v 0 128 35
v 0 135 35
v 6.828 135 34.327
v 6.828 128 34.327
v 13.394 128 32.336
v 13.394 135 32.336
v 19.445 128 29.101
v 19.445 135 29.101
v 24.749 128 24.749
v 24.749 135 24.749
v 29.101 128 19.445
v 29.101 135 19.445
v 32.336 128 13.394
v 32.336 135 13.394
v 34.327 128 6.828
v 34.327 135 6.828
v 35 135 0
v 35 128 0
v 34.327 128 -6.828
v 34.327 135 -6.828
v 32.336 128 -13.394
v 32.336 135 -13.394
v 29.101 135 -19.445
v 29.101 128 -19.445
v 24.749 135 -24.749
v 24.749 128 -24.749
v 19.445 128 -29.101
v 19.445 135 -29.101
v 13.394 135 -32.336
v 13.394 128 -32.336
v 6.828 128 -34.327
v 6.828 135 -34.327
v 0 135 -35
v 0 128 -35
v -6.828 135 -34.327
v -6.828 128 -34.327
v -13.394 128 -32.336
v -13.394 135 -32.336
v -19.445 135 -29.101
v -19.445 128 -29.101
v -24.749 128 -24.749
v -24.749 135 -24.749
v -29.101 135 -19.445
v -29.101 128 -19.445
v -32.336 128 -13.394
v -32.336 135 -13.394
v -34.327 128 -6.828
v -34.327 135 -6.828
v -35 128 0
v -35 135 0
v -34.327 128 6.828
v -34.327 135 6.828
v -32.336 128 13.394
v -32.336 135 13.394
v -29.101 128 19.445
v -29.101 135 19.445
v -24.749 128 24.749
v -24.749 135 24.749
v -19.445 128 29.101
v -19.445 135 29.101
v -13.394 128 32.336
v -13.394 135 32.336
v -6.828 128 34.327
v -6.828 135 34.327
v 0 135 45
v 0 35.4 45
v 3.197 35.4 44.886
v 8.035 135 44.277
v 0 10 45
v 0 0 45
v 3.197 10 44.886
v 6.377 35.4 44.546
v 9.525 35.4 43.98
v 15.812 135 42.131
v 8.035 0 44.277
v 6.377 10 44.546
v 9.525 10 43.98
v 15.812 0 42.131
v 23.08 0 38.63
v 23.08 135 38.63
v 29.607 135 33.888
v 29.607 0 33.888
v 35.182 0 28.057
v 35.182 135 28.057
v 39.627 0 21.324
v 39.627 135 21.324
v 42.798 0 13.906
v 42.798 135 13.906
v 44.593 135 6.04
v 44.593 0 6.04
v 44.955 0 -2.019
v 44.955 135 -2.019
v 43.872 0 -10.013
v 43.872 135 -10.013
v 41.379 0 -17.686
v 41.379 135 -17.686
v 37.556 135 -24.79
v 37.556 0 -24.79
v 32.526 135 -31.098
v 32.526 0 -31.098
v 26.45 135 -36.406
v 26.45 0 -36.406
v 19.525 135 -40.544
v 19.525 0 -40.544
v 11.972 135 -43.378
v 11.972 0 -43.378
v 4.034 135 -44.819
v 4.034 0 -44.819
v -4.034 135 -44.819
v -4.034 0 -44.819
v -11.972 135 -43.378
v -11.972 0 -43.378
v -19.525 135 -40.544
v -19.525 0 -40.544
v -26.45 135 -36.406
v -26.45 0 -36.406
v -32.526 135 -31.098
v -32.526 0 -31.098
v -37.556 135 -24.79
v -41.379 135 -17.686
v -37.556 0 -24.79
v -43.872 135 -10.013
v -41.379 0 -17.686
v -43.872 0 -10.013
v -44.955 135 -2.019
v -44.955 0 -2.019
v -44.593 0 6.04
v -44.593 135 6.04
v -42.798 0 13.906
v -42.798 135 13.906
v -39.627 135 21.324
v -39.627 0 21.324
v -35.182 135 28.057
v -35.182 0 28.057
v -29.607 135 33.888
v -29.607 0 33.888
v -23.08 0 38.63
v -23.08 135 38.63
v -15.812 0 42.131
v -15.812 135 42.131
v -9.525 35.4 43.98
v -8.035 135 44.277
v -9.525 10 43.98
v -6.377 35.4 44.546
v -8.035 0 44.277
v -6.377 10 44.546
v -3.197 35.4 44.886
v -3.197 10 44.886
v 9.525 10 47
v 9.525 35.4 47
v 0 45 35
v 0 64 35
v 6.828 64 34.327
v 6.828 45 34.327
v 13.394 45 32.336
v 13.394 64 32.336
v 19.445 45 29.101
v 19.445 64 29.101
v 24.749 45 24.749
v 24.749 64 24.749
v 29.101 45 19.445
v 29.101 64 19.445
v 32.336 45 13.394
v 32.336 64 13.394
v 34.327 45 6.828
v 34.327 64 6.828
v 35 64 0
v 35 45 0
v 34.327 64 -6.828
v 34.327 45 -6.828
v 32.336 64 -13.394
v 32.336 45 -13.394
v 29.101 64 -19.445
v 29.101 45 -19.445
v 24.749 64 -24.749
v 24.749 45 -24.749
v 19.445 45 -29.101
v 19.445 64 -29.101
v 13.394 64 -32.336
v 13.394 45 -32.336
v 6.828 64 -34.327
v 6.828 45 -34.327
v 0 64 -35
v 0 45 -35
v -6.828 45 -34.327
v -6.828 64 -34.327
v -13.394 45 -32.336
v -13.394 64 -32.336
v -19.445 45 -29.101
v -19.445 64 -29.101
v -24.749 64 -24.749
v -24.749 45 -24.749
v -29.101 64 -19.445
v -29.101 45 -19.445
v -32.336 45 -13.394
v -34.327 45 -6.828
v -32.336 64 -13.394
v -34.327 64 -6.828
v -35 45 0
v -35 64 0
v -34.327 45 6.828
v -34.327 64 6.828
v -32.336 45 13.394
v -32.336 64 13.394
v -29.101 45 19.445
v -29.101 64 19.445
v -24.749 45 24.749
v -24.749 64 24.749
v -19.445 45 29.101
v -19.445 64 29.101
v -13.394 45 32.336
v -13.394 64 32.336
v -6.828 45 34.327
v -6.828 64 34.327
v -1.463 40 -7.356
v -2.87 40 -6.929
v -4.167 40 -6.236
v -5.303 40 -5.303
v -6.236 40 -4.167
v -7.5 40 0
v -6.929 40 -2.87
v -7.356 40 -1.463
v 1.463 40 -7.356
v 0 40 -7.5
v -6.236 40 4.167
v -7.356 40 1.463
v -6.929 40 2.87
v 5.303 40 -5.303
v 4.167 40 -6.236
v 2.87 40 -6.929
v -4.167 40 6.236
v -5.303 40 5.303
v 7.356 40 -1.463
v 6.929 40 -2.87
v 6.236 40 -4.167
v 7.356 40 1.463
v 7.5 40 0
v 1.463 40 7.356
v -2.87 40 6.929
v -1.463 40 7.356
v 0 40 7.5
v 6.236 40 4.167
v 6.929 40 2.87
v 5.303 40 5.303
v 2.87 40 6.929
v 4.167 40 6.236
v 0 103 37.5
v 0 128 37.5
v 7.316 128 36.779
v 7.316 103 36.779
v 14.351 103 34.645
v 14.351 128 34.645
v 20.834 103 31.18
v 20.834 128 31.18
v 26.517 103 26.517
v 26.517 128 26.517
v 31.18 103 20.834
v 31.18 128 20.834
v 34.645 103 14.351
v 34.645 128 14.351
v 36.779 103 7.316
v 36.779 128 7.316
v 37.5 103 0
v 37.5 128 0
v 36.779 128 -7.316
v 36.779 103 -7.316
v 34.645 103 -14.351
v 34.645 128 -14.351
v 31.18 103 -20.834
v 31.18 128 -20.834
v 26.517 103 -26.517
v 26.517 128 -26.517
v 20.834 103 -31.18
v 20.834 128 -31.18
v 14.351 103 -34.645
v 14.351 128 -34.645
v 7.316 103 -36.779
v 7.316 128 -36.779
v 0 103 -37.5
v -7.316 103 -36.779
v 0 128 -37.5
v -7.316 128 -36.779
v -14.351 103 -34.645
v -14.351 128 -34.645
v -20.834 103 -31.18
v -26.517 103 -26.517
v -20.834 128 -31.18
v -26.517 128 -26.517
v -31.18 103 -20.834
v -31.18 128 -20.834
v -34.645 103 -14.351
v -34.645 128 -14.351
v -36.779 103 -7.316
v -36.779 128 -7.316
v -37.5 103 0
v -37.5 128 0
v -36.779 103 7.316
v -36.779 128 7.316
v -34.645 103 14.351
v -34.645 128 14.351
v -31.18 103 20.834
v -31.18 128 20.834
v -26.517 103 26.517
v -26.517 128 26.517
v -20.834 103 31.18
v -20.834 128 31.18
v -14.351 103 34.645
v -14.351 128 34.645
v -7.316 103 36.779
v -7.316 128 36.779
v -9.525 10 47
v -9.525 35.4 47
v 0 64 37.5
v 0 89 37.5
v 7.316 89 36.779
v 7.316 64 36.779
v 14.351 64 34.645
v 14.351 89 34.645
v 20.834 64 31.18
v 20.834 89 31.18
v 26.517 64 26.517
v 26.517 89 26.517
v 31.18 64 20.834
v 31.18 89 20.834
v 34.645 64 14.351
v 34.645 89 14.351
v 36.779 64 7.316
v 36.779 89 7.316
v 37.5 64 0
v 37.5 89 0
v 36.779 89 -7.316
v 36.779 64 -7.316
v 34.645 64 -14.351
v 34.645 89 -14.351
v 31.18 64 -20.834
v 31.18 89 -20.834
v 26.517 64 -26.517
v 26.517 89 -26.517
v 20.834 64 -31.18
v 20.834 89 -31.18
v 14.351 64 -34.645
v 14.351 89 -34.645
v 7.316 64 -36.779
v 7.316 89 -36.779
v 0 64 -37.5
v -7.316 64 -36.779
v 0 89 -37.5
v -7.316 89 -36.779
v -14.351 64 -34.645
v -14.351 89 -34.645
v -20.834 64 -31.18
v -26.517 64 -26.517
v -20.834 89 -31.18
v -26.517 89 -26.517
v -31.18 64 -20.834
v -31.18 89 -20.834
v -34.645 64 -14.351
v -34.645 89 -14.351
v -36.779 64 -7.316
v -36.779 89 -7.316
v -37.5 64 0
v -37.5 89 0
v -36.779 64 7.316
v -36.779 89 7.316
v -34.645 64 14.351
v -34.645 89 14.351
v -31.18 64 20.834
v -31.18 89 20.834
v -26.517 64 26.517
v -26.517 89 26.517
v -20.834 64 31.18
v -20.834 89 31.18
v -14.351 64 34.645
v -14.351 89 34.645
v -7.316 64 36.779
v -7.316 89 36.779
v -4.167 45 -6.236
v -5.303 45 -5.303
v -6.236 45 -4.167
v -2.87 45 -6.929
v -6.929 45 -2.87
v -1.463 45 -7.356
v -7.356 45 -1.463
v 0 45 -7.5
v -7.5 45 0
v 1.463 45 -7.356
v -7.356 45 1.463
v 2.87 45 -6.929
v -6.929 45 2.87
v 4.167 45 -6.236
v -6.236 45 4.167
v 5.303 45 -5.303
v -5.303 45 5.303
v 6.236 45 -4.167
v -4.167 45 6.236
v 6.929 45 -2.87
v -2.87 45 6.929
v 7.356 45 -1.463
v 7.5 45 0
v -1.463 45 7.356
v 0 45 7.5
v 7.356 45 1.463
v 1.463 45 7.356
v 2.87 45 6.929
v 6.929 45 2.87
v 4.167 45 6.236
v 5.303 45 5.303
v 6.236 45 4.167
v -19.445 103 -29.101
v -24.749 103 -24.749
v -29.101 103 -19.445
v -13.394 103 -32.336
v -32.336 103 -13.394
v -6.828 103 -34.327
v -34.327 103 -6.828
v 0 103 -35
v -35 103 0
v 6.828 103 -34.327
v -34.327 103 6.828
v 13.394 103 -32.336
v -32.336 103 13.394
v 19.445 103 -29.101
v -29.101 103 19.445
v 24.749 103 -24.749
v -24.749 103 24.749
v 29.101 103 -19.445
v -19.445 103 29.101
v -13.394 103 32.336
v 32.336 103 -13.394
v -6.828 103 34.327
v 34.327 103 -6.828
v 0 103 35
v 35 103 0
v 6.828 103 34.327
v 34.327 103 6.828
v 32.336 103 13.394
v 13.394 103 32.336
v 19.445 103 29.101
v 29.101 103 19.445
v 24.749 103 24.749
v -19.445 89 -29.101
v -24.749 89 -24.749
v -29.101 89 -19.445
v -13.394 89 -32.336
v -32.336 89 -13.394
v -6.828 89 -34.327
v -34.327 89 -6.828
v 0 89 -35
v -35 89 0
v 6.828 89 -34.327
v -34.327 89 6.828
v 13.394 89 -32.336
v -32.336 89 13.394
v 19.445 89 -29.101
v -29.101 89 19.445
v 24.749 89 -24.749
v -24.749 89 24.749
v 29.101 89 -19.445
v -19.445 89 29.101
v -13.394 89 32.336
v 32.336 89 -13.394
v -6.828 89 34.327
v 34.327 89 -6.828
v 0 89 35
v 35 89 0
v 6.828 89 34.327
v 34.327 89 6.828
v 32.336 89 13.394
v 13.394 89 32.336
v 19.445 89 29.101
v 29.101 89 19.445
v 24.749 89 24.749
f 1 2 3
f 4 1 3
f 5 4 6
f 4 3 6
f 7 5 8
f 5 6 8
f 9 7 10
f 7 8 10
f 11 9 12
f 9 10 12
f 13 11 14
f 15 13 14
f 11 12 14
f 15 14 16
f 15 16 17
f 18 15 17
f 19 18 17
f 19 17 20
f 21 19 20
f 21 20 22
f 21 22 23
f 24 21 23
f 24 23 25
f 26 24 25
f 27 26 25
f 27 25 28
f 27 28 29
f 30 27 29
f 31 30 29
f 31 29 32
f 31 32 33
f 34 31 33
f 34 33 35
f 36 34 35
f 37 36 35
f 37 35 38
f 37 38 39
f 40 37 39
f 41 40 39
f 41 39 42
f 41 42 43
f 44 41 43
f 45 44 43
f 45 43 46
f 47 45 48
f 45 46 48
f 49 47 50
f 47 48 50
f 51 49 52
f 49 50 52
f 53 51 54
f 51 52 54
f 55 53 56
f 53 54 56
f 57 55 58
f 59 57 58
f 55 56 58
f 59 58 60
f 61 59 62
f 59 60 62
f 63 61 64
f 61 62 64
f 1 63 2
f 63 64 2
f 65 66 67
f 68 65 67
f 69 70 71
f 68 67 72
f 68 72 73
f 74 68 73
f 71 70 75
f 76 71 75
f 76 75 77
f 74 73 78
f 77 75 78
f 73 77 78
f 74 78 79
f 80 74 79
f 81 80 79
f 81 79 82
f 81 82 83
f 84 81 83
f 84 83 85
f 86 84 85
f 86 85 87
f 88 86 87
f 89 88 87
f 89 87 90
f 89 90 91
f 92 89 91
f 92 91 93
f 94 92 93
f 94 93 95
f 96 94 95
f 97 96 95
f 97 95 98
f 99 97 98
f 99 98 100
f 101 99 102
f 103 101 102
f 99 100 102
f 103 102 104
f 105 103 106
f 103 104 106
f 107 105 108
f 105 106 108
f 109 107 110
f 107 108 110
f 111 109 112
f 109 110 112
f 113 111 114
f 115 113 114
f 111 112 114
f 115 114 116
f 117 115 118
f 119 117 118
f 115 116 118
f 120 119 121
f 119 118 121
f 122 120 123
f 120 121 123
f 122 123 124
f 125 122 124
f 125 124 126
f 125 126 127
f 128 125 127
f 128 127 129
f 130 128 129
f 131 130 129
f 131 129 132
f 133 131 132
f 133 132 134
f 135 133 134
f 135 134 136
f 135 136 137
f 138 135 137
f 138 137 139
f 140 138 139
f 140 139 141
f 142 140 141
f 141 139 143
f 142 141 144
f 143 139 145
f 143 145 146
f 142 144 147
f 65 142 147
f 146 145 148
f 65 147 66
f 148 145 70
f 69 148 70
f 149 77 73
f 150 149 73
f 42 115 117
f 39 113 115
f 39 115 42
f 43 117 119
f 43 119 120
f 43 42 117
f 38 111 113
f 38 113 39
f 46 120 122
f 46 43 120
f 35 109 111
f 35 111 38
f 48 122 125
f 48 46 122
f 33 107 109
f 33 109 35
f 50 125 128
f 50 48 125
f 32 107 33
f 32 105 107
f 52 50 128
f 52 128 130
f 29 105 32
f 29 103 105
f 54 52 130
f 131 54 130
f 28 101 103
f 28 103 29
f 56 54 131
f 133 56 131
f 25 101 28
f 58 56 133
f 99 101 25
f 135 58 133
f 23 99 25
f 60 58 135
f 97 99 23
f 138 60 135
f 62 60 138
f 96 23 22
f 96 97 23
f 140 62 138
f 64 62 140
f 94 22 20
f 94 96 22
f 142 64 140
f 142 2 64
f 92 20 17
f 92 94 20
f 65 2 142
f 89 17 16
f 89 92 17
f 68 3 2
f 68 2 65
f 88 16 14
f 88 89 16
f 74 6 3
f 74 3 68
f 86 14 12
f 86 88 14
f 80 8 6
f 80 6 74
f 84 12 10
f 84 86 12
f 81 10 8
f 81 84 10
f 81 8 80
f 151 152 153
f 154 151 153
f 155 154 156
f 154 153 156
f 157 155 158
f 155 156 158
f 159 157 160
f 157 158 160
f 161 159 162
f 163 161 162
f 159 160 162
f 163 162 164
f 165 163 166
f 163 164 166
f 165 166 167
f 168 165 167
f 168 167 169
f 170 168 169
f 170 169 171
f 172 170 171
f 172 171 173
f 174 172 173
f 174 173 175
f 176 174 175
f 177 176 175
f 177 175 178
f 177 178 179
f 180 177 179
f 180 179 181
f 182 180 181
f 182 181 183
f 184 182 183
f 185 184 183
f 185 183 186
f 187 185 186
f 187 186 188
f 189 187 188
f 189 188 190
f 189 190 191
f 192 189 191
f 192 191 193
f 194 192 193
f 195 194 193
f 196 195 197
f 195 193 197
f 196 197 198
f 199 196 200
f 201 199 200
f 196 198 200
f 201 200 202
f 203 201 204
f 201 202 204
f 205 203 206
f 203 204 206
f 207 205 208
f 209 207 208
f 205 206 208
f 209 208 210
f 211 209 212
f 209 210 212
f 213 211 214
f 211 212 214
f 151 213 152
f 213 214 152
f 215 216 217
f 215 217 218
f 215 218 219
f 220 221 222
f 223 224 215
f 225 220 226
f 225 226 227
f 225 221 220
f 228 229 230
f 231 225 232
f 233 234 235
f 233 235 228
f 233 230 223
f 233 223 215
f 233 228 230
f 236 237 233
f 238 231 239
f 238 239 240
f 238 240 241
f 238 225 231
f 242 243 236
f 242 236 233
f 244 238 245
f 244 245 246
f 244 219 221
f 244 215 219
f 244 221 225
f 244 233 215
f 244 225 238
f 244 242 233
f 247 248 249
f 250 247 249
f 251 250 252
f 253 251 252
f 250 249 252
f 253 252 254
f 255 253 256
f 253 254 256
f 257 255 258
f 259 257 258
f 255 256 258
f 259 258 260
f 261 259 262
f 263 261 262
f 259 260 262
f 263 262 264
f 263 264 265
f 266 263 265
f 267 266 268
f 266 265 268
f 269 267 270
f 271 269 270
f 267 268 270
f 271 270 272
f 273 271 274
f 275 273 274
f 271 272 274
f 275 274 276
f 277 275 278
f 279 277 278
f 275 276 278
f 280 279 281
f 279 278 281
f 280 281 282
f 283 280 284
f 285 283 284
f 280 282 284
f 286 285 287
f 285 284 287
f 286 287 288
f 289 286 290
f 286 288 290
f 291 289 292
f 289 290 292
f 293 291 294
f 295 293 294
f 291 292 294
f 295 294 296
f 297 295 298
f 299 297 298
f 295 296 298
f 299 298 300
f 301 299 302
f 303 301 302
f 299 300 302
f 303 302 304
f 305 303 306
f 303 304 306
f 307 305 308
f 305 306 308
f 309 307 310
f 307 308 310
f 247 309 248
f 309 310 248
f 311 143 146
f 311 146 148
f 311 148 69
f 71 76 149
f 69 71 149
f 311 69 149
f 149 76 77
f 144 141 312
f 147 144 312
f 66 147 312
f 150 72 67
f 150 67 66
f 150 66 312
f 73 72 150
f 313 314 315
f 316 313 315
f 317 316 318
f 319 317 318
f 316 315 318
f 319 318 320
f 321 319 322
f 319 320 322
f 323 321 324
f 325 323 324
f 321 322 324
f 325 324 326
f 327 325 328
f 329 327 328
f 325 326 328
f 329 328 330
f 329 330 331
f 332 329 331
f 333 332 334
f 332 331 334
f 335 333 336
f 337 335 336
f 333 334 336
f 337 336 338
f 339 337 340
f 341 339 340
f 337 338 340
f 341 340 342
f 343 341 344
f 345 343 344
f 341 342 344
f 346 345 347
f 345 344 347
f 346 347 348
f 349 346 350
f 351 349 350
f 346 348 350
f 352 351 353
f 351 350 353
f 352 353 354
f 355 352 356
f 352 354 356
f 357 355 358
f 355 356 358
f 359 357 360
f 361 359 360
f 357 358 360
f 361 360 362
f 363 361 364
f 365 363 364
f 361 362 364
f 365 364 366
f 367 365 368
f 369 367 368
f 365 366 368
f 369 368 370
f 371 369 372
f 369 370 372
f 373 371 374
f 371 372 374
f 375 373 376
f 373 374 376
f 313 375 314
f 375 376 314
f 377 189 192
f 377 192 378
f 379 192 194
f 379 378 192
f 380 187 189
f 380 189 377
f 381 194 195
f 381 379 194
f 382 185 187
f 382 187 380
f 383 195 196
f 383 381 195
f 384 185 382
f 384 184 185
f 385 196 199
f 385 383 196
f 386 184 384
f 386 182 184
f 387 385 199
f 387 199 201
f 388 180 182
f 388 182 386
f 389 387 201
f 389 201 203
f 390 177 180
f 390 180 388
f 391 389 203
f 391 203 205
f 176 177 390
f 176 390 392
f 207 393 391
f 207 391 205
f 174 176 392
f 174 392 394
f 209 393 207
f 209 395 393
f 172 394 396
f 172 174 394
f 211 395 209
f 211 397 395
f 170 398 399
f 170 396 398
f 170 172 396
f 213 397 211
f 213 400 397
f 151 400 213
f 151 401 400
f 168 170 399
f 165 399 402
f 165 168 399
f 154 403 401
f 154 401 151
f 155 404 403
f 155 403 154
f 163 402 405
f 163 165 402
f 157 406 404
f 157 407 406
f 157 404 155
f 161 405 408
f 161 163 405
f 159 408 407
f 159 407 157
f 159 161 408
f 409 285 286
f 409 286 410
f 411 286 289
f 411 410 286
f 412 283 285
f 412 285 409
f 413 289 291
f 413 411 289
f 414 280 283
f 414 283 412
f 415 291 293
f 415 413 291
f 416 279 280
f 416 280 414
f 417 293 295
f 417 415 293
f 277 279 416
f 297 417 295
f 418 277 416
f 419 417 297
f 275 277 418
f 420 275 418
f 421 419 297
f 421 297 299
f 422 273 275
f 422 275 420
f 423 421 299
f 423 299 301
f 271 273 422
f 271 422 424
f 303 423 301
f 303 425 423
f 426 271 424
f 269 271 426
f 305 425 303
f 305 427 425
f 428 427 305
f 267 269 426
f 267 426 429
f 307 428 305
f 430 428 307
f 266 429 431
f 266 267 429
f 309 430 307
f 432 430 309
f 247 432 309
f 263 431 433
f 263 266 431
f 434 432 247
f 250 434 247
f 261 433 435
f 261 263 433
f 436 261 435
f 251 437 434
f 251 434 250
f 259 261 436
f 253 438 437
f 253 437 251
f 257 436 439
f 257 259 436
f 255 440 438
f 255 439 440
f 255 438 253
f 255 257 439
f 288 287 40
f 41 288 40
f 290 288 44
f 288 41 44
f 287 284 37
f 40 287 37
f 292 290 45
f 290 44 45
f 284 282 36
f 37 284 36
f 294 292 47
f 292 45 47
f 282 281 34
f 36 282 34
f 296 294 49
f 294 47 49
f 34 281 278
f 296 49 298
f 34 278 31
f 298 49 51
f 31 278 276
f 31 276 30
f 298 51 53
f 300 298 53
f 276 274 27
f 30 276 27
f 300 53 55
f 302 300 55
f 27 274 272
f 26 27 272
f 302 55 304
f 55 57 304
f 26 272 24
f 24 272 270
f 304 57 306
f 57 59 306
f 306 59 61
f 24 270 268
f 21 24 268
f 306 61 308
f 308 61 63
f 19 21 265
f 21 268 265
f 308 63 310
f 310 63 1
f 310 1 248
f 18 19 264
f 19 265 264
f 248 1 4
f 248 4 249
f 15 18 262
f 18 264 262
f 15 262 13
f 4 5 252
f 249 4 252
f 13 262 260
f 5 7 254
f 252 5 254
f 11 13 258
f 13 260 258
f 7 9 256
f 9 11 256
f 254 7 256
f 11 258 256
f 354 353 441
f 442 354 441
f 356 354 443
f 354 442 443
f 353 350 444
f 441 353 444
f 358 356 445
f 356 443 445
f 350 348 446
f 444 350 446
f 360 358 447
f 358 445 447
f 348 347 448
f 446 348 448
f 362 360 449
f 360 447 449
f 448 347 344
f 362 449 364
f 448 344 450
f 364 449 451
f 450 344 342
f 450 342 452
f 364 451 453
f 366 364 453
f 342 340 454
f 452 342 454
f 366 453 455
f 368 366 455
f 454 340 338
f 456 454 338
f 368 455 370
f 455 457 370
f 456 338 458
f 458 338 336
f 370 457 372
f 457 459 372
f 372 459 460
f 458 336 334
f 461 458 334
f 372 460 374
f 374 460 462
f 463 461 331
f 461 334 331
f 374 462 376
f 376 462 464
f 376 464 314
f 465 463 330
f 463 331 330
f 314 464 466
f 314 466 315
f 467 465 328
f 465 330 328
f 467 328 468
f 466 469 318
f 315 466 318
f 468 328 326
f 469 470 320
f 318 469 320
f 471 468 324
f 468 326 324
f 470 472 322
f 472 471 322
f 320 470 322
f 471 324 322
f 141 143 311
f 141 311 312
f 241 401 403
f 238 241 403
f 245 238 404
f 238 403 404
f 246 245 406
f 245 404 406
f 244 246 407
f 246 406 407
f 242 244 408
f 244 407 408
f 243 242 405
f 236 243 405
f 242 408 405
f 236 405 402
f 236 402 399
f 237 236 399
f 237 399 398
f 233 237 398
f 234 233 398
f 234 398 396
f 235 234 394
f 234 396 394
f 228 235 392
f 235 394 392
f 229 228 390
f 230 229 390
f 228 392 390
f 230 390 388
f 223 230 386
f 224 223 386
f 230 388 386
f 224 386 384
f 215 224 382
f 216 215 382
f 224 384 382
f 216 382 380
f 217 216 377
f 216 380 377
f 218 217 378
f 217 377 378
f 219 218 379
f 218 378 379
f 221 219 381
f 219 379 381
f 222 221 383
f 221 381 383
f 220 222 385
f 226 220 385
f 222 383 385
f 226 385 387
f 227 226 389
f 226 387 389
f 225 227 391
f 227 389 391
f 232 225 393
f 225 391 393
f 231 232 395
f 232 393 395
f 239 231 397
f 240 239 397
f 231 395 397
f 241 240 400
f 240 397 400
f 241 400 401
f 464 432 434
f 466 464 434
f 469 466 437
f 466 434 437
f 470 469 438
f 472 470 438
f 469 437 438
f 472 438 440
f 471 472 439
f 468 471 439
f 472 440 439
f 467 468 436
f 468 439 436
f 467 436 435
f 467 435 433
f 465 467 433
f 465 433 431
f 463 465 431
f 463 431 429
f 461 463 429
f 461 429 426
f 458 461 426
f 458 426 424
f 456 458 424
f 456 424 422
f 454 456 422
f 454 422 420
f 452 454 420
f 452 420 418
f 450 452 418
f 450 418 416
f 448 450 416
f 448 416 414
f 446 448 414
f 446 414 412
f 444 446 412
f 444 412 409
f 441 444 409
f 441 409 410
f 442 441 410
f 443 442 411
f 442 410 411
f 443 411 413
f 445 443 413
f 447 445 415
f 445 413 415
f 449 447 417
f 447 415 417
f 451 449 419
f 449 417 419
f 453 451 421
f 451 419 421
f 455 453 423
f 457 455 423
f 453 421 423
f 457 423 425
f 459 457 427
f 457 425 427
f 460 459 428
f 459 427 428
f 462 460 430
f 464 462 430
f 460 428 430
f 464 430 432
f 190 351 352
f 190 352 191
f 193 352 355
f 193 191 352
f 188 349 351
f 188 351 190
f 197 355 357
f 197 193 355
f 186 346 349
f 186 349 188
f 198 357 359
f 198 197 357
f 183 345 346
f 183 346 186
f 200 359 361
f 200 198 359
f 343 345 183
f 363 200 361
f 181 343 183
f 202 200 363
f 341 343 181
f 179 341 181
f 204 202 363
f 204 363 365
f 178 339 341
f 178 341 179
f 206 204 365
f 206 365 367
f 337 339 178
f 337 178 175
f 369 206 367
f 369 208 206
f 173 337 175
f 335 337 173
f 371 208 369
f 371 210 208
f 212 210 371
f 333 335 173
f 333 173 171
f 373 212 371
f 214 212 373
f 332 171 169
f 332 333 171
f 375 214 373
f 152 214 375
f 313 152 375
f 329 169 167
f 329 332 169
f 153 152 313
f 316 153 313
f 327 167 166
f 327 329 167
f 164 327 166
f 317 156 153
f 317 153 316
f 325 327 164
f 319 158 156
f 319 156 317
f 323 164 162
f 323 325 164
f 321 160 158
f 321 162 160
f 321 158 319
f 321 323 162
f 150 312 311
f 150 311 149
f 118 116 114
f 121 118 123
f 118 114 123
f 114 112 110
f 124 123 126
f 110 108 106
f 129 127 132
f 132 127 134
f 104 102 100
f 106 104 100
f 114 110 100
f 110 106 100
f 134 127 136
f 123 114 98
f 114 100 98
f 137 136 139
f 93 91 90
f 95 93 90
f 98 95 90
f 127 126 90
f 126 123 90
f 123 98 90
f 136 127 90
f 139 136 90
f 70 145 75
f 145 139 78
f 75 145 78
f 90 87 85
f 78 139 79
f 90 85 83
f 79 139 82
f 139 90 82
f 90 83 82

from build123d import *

# Parameters (mm, degrees)
SKETCH1_R                = 45
BOSS_EXTRUDE1_DEPTH      = 135
SKETCH2_R                = 35
CUT_EXTRUDE1_DEPTH       = 90
SKETCH3_R                = 37.5
SKETCH3_R_2              = 35
CUT_EXTRUDE2_DEPTH       = 25
SKETCH4_R                = 37.5
SKETCH4_R_2              = 35
CUT_EXTRUDE3_DEPTH       = 25
SKETCH5_R                = 7.5
CUT_EXTRUDE4_DEPTH       = 5
BOSS_EXTRUDE2_DEPTH      = 2
BOSS_EXTRUDE2_DEPTH_BACK = 4
SKETCH6_W                = 19.05
SKETCH6_H                = 25.4


with BuildPart() as part:
    # Sketch1 → Boss-Extrude1 (new body)
    with BuildSketch(Plane(origin=(0, 0, 0), x_dir=(1, 0, 0), z_dir=(0, 1, 0))):
        with Locations(Location((0, 0, 0), (0, 0, 270))):
            Circle(SKETCH1_R)
    extrude(amount=BOSS_EXTRUDE1_DEPTH)

    # Sketch2 → Cut-Extrude1 (cut)
    with BuildSketch(Plane(origin=(0, 135, 0), x_dir=(1, 0, 0), z_dir=(0, 1, 0))):
        with Locations(Location((0, 0, 0), (0, 0, 270))):
            Circle(SKETCH2_R)
    extrude(amount=-CUT_EXTRUDE1_DEPTH, mode=Mode.SUBTRACT)

    # Sketch3 → Cut-Extrude2 (cut)
    with BuildSketch(Plane(origin=(0, 128, 0), x_dir=(1, 0, 0), z_dir=(0, 1, 0))):
        with Locations(Location((0, 0, 0), (0, 0, 270))):
            Circle(SKETCH3_R)
        with Locations(Location((0, 0, 0), (0, 0, 270))):
            Circle(SKETCH3_R_2, mode=Mode.SUBTRACT)
    extrude(amount=-CUT_EXTRUDE2_DEPTH, mode=Mode.SUBTRACT)

    # Sketch4 → Cut-Extrude3 (cut)
    with BuildSketch(Plane(origin=(0, 89, 0), x_dir=(1, 0, 0), z_dir=(0, 1, 0))):
        with Locations(Location((0, 0, 0), (0, 0, 270))):
            Circle(SKETCH4_R)
        with Locations(Location((0, 0, 0), (0, 0, 270))):
            Circle(SKETCH4_R_2, mode=Mode.SUBTRACT)
    extrude(amount=-CUT_EXTRUDE3_DEPTH, mode=Mode.SUBTRACT)

    # Sketch5 → Cut-Extrude4 (cut)
    with BuildSketch(Plane(origin=(0, 45, 0), x_dir=(1, 0, 0), z_dir=(0, 1, 0))):
        with Locations(Location((0, 0, 0), (0, 0, 270))):
            Circle(SKETCH5_R)
    extrude(amount=-CUT_EXTRUDE4_DEPTH, mode=Mode.SUBTRACT)

    # Sketch6 → Boss-Extrude2 (add, two sides: drawn at the far end of the back side and taken through both)
    with BuildSketch(Plane.XY.offset(45).offset(-BOSS_EXTRUDE2_DEPTH_BACK)):
        with Locations((0, 22.7)):
            Rectangle(SKETCH6_W, SKETCH6_H)
    extrude(amount=BOSS_EXTRUDE2_DEPTH + BOSS_EXTRUDE2_DEPTH_BACK)


solid = part.part
